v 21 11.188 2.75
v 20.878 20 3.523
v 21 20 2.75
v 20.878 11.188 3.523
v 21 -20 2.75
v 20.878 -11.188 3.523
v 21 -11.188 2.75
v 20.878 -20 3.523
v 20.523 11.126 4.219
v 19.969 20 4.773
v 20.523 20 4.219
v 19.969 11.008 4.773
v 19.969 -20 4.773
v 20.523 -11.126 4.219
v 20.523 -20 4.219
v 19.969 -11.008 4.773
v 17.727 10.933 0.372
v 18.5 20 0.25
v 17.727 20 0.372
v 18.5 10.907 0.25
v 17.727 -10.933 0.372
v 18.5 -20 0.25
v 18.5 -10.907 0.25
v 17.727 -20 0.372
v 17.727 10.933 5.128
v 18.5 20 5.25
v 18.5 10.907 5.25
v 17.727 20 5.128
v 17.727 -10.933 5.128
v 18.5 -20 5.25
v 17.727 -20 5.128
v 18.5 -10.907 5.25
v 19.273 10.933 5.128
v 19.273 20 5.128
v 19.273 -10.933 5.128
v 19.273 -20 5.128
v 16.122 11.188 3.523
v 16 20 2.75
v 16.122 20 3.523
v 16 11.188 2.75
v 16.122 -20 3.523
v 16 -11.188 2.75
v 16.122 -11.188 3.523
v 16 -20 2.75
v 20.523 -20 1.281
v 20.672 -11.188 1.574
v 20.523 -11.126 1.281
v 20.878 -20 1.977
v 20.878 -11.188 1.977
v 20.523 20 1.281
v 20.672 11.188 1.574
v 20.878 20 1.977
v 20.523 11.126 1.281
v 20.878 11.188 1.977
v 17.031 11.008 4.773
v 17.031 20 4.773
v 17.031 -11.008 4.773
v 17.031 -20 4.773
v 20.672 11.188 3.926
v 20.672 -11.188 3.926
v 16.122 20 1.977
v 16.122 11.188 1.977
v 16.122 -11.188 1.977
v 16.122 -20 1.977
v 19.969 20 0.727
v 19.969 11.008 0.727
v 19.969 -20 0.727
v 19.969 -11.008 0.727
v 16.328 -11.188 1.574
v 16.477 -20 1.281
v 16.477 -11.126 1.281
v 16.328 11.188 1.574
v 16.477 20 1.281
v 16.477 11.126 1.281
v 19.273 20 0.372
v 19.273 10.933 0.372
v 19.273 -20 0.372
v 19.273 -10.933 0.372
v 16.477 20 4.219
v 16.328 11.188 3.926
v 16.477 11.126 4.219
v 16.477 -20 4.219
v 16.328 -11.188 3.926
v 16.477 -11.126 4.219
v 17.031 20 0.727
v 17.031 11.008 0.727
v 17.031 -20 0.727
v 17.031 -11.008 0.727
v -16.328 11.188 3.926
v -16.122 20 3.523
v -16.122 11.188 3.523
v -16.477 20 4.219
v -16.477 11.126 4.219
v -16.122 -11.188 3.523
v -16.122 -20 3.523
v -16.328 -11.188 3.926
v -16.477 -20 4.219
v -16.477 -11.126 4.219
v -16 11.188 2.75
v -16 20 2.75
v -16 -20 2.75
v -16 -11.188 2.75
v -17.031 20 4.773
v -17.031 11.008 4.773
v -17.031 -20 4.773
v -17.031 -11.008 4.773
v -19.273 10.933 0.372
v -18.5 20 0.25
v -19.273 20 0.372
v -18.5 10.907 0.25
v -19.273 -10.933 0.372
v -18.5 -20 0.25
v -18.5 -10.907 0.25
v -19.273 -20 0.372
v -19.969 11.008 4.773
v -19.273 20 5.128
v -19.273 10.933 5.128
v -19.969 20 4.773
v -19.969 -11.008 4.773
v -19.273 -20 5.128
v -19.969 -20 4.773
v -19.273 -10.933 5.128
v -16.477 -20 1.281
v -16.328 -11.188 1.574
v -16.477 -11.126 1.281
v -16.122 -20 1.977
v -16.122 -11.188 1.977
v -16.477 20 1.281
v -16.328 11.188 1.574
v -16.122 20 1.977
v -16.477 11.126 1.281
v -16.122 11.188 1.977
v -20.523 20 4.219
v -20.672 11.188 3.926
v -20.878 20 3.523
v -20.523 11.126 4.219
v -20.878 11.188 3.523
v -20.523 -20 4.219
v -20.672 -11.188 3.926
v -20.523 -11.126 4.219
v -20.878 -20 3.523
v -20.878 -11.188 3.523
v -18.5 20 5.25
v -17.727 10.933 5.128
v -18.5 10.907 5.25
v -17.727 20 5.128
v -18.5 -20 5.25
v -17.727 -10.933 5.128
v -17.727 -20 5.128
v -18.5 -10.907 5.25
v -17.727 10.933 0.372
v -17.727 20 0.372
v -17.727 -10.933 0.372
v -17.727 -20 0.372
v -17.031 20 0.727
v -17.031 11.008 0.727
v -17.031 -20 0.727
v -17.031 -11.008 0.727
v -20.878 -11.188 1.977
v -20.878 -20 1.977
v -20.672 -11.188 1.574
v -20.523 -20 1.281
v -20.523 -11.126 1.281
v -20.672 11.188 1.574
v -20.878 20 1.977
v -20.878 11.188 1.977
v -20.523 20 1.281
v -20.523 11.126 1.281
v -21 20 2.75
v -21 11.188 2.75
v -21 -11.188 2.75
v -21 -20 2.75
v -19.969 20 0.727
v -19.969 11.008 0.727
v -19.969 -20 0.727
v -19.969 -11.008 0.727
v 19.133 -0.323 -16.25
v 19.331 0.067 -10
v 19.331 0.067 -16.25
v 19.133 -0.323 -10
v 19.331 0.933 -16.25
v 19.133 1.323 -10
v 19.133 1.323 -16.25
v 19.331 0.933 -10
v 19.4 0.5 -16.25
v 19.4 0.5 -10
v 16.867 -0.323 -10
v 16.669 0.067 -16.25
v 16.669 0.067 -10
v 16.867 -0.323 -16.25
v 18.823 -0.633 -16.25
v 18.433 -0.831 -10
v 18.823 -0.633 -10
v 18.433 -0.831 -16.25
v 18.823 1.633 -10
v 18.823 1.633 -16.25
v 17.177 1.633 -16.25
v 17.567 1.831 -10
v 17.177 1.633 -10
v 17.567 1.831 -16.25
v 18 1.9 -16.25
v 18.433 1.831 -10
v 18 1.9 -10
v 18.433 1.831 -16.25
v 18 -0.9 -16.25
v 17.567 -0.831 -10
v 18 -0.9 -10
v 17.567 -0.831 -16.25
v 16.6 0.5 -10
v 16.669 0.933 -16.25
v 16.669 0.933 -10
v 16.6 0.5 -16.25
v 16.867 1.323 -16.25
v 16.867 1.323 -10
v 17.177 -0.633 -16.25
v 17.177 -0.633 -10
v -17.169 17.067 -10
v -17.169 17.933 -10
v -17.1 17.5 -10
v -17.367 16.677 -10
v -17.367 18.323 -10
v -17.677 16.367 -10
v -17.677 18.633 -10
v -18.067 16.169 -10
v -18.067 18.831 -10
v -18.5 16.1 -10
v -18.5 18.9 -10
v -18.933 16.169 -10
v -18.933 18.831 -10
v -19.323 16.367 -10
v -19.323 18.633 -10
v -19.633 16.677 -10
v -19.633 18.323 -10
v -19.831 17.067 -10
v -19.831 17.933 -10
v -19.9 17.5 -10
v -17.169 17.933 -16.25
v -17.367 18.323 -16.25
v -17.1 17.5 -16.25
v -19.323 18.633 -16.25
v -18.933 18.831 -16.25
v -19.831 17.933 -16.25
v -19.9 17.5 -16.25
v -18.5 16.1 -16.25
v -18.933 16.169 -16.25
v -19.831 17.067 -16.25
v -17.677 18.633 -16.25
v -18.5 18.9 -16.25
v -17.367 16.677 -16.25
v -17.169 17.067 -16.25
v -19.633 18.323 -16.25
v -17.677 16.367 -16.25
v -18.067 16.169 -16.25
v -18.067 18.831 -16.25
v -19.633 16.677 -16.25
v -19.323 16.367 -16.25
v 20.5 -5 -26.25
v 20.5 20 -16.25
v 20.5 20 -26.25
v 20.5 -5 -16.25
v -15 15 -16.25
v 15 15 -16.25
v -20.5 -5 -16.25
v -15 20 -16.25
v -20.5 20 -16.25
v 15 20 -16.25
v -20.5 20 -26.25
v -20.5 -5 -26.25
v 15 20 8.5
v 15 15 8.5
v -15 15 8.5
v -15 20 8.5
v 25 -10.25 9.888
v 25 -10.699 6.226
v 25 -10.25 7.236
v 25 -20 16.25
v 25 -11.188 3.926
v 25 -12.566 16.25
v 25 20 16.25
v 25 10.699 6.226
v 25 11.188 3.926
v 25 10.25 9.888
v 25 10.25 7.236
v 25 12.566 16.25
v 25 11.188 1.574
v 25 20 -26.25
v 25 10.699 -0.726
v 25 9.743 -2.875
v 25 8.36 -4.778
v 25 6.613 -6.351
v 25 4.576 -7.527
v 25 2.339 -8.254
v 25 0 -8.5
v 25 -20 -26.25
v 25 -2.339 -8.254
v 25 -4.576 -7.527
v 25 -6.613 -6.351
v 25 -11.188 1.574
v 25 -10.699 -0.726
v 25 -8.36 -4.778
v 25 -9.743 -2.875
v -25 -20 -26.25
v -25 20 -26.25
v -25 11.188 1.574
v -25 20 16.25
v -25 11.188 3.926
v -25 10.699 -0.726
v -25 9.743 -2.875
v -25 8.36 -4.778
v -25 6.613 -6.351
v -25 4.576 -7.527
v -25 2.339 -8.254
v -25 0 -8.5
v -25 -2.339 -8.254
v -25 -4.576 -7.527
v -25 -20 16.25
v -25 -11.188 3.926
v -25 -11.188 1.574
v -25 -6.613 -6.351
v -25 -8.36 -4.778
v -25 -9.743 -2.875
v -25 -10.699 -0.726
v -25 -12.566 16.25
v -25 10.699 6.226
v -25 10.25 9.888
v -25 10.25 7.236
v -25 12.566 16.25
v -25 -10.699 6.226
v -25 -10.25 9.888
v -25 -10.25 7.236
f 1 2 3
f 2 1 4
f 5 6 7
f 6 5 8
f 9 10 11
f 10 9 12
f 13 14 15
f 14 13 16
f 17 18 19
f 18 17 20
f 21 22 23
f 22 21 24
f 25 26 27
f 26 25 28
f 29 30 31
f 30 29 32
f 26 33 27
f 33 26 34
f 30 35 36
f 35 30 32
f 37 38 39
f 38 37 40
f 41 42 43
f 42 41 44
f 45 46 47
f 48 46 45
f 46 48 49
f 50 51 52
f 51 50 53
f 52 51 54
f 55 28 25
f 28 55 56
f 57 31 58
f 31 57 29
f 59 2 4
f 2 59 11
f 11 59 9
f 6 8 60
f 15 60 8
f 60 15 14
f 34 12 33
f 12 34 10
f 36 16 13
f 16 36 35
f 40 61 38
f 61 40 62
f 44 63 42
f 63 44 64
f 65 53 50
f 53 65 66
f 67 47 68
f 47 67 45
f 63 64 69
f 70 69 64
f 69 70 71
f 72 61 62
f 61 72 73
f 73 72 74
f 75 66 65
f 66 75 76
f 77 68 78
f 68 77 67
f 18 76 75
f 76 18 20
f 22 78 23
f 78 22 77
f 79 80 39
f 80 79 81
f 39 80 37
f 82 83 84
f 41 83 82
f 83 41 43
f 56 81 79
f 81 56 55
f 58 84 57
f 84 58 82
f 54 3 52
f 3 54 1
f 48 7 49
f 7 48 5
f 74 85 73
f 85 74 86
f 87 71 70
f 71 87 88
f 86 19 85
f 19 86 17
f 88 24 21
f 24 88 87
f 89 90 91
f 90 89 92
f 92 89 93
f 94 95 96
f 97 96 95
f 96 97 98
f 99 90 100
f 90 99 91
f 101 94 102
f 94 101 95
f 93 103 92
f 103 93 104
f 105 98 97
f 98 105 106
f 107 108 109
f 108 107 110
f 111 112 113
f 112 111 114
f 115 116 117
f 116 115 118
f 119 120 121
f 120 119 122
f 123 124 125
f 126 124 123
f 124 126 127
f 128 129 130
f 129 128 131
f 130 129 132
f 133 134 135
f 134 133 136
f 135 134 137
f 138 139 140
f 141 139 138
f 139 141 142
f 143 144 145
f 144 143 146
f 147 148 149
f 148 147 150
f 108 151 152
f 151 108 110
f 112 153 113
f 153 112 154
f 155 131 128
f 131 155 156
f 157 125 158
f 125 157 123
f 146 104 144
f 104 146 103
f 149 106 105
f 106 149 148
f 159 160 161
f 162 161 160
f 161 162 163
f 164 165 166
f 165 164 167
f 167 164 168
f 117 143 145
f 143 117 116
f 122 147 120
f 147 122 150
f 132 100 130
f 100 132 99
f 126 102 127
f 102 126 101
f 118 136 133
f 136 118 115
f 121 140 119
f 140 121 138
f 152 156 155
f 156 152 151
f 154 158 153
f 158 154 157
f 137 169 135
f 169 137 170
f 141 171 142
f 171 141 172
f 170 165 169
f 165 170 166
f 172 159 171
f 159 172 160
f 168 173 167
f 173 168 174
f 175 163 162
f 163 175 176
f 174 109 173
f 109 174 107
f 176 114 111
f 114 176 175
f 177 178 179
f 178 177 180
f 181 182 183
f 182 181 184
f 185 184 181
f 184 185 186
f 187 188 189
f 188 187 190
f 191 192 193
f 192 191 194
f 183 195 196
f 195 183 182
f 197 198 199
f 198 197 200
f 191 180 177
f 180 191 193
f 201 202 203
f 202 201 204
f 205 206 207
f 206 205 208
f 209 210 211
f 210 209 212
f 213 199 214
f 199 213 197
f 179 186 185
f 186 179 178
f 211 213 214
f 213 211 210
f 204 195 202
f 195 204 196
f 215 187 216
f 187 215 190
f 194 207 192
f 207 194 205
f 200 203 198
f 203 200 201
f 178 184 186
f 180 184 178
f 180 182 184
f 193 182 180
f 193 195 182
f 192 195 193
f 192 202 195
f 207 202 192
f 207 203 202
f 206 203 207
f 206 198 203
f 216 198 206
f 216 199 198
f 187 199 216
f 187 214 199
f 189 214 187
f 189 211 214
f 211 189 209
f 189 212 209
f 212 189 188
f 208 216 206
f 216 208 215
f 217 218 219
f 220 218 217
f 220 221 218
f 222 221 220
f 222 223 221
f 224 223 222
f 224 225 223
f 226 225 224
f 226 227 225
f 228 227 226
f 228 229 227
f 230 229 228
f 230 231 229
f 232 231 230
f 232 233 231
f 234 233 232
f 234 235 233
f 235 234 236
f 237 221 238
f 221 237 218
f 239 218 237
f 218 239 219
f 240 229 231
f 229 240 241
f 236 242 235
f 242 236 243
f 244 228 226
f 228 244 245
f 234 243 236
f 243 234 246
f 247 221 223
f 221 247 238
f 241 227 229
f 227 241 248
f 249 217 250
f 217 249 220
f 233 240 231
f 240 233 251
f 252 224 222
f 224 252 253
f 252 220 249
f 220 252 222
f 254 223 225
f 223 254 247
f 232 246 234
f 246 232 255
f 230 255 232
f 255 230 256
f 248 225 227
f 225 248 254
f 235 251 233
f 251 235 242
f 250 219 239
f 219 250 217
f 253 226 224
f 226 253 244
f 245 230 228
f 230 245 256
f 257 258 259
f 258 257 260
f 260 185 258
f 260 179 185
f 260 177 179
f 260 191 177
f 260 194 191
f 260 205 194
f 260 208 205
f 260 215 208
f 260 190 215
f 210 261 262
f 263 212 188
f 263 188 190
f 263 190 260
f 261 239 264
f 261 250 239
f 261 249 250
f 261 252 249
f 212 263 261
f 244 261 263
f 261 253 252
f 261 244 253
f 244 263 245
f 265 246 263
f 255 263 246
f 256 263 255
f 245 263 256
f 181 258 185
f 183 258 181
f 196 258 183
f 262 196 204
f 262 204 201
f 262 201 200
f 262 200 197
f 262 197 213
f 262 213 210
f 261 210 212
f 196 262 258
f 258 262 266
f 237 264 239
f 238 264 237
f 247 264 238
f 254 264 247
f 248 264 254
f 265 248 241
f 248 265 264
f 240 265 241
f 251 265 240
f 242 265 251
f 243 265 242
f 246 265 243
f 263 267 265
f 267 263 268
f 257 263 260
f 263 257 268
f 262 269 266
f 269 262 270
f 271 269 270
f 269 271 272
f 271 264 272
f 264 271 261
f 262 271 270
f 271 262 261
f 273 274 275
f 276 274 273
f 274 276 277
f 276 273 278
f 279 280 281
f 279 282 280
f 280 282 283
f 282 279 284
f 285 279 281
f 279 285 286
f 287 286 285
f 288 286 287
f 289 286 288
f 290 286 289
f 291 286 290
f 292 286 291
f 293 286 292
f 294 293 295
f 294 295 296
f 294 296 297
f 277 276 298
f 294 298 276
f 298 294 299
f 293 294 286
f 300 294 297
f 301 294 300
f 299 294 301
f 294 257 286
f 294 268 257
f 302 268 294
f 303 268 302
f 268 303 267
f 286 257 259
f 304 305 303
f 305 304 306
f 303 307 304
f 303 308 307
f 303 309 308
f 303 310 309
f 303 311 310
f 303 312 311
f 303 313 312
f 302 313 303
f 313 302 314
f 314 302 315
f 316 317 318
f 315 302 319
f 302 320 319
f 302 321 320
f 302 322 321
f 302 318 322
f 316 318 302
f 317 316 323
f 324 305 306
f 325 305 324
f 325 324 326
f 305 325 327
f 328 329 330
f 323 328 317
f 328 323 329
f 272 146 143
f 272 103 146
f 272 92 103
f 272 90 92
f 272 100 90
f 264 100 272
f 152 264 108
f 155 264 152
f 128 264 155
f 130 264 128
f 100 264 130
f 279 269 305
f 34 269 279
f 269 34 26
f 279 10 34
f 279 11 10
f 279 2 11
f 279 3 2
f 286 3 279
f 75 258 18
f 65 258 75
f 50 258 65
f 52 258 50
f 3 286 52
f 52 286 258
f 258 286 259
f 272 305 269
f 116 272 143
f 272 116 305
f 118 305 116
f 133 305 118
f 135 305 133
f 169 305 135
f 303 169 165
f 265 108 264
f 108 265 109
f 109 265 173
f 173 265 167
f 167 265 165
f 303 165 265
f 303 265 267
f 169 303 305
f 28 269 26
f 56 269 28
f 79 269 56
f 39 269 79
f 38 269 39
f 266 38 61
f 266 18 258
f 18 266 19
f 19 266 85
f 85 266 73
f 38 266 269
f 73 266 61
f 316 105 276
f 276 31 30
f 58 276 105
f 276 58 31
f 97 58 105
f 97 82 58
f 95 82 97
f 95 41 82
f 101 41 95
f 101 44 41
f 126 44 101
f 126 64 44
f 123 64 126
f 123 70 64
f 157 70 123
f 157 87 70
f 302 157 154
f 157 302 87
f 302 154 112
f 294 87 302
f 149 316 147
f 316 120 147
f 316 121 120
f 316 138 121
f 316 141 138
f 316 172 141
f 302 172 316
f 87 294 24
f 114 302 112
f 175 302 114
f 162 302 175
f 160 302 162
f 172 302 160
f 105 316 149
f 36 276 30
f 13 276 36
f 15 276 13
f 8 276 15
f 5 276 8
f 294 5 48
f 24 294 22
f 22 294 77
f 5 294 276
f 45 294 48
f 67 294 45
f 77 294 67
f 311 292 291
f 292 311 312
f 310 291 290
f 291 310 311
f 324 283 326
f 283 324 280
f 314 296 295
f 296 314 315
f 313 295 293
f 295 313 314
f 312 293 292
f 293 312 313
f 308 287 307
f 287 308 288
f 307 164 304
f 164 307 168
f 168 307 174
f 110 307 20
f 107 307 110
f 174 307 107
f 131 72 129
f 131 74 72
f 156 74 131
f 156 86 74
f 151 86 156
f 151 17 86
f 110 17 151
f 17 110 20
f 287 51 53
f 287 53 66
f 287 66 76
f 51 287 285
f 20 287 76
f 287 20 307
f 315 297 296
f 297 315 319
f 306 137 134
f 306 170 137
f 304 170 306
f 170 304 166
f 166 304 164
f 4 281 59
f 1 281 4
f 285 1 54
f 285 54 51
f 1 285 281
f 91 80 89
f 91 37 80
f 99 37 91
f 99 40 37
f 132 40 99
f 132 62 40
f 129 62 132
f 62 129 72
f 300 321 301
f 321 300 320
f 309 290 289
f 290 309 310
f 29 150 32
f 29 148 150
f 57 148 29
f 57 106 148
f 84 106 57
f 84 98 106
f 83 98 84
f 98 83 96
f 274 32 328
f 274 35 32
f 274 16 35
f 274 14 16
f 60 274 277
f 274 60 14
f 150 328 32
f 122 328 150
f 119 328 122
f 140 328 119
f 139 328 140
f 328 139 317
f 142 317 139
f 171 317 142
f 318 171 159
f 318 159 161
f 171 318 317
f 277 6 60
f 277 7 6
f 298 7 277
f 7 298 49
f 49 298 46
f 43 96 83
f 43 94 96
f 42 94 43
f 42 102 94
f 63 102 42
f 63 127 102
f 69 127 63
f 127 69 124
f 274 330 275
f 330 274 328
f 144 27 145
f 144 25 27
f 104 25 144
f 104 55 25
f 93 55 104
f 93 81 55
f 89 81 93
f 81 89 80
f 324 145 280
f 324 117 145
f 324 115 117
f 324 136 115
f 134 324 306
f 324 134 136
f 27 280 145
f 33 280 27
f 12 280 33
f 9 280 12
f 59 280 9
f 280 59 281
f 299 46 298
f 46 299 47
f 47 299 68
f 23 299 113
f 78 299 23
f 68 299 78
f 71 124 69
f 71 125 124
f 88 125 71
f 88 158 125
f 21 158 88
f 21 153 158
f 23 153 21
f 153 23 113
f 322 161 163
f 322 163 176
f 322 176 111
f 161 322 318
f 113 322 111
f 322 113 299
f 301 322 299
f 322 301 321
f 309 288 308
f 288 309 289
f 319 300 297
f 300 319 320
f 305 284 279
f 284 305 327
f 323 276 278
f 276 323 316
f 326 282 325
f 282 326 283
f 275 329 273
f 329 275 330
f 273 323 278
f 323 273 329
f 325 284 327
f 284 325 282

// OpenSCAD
przycisk_h = 20;
przycisk_dl =41;
przycisk_sz = 30;

trzon_sz = 15;
trzon_dl = 30;
trzon_h = 25;

nakladka_sz = 40; //31.4
nakladka_dl = 50;
nakladka_h = 32.5;
dno_grubosc = 7.75;

rama_sr = 22.5;

wkret_sr = 2.8;

sruba_sr = 5;
sruba_od_dna = 15.35;
sruba_od_boku = 12.7;
sruby_odstep = 37;

mocowanie_h = 45; //35
mocowanie_sr1 = 10; // lub 12
mocowanie_gr = (nakladka_sz-rama_sr)/2;
mocowanie_dl = 35;



module sruba_dziura(sr){
    rotate([90,0,0]){
        cylinder(h=nakladka_sz+30, d=sr, center=true, $fn=20);
        
    }
}

module mocowanie(h, sr1, gr, dl, sr2){
    difference(){
    cube([dl, gr, h],center = true);
    
  
    translate([0,0,h/2-10-sr2/2]){
    rotate([90,0,0]){
    cylinder(gr+10, d=sr2, center=true, $fn=20);
    }
    }
    
    }
}

union(){
    difference(){
        cube([nakladka_dl, nakladka_sz, nakladka_h+przycisk_h], center=true);
        
        translate([0,0,-nakladka_h/2+dno_grubosc+rama_sr/2]){
        rotate([0,90,0]){
            cylinder(h=nakladka_dl+30, d=rama_sr, center=true);
            
        }
        }
        
         translate([0,0,nakladka_h]){
            cube([nakladka_dl+30, nakladka_sz+30, nakladka_h],center = true);
        }
        
        translate([0,0,dno_grubosc+rama_sr/2]){
            cube([nakladka_dl+30, rama_sr-2, nakladka_h],center = true);
        }
        
        rotate([20,0,0]){
                translate([0,0,dno_grubosc+rama_sr/2]){
            cube([nakladka_dl+30, rama_sr-10, nakladka_h],center = true);
        }}
        rotate([-20,0,0]){
                translate([0,0,dno_grubosc+rama_sr/2]){
            cube([nakladka_dl+30, rama_sr-10, nakladka_h],center = true);
        }}
        
         
        
        rotate([0,0,0]){
        translate([sruby_odstep/2,0,-nakladka_h/2+dno_grubosc+rama_sr/2]){
            sruba_dziura(sruba_sr);
            
            translate([-sruby_odstep,0,0]){
               sruba_dziura(sruba_sr); 
            }}
            

            
        }
        
        translate([0,nakladka_sz/2-przycisk_sz/2+5,0]){
        translate([0,0,-nakladka_h/2-10]){
            #cube([przycisk_dl, przycisk_sz, przycisk_h],center = true);
        }
        translate([0,nakladka_sz/2-trzon_sz/2,-4]){
            #cube([trzon_dl, trzon_sz, trzon_h],center = true);
        }
           rotate([-90,0,0]){
        translate([przycisk_dl/2-2.5,45,-przycisk_sz/2+5.5]){
            sruba_dziura(wkret_sr);
        }
            translate([-(przycisk_dl/2-2),45,-(-przycisk_sz/2+7.5)]){
               #sruba_dziura(wkret_sr); 
            }

    }

    
    }
}


}
